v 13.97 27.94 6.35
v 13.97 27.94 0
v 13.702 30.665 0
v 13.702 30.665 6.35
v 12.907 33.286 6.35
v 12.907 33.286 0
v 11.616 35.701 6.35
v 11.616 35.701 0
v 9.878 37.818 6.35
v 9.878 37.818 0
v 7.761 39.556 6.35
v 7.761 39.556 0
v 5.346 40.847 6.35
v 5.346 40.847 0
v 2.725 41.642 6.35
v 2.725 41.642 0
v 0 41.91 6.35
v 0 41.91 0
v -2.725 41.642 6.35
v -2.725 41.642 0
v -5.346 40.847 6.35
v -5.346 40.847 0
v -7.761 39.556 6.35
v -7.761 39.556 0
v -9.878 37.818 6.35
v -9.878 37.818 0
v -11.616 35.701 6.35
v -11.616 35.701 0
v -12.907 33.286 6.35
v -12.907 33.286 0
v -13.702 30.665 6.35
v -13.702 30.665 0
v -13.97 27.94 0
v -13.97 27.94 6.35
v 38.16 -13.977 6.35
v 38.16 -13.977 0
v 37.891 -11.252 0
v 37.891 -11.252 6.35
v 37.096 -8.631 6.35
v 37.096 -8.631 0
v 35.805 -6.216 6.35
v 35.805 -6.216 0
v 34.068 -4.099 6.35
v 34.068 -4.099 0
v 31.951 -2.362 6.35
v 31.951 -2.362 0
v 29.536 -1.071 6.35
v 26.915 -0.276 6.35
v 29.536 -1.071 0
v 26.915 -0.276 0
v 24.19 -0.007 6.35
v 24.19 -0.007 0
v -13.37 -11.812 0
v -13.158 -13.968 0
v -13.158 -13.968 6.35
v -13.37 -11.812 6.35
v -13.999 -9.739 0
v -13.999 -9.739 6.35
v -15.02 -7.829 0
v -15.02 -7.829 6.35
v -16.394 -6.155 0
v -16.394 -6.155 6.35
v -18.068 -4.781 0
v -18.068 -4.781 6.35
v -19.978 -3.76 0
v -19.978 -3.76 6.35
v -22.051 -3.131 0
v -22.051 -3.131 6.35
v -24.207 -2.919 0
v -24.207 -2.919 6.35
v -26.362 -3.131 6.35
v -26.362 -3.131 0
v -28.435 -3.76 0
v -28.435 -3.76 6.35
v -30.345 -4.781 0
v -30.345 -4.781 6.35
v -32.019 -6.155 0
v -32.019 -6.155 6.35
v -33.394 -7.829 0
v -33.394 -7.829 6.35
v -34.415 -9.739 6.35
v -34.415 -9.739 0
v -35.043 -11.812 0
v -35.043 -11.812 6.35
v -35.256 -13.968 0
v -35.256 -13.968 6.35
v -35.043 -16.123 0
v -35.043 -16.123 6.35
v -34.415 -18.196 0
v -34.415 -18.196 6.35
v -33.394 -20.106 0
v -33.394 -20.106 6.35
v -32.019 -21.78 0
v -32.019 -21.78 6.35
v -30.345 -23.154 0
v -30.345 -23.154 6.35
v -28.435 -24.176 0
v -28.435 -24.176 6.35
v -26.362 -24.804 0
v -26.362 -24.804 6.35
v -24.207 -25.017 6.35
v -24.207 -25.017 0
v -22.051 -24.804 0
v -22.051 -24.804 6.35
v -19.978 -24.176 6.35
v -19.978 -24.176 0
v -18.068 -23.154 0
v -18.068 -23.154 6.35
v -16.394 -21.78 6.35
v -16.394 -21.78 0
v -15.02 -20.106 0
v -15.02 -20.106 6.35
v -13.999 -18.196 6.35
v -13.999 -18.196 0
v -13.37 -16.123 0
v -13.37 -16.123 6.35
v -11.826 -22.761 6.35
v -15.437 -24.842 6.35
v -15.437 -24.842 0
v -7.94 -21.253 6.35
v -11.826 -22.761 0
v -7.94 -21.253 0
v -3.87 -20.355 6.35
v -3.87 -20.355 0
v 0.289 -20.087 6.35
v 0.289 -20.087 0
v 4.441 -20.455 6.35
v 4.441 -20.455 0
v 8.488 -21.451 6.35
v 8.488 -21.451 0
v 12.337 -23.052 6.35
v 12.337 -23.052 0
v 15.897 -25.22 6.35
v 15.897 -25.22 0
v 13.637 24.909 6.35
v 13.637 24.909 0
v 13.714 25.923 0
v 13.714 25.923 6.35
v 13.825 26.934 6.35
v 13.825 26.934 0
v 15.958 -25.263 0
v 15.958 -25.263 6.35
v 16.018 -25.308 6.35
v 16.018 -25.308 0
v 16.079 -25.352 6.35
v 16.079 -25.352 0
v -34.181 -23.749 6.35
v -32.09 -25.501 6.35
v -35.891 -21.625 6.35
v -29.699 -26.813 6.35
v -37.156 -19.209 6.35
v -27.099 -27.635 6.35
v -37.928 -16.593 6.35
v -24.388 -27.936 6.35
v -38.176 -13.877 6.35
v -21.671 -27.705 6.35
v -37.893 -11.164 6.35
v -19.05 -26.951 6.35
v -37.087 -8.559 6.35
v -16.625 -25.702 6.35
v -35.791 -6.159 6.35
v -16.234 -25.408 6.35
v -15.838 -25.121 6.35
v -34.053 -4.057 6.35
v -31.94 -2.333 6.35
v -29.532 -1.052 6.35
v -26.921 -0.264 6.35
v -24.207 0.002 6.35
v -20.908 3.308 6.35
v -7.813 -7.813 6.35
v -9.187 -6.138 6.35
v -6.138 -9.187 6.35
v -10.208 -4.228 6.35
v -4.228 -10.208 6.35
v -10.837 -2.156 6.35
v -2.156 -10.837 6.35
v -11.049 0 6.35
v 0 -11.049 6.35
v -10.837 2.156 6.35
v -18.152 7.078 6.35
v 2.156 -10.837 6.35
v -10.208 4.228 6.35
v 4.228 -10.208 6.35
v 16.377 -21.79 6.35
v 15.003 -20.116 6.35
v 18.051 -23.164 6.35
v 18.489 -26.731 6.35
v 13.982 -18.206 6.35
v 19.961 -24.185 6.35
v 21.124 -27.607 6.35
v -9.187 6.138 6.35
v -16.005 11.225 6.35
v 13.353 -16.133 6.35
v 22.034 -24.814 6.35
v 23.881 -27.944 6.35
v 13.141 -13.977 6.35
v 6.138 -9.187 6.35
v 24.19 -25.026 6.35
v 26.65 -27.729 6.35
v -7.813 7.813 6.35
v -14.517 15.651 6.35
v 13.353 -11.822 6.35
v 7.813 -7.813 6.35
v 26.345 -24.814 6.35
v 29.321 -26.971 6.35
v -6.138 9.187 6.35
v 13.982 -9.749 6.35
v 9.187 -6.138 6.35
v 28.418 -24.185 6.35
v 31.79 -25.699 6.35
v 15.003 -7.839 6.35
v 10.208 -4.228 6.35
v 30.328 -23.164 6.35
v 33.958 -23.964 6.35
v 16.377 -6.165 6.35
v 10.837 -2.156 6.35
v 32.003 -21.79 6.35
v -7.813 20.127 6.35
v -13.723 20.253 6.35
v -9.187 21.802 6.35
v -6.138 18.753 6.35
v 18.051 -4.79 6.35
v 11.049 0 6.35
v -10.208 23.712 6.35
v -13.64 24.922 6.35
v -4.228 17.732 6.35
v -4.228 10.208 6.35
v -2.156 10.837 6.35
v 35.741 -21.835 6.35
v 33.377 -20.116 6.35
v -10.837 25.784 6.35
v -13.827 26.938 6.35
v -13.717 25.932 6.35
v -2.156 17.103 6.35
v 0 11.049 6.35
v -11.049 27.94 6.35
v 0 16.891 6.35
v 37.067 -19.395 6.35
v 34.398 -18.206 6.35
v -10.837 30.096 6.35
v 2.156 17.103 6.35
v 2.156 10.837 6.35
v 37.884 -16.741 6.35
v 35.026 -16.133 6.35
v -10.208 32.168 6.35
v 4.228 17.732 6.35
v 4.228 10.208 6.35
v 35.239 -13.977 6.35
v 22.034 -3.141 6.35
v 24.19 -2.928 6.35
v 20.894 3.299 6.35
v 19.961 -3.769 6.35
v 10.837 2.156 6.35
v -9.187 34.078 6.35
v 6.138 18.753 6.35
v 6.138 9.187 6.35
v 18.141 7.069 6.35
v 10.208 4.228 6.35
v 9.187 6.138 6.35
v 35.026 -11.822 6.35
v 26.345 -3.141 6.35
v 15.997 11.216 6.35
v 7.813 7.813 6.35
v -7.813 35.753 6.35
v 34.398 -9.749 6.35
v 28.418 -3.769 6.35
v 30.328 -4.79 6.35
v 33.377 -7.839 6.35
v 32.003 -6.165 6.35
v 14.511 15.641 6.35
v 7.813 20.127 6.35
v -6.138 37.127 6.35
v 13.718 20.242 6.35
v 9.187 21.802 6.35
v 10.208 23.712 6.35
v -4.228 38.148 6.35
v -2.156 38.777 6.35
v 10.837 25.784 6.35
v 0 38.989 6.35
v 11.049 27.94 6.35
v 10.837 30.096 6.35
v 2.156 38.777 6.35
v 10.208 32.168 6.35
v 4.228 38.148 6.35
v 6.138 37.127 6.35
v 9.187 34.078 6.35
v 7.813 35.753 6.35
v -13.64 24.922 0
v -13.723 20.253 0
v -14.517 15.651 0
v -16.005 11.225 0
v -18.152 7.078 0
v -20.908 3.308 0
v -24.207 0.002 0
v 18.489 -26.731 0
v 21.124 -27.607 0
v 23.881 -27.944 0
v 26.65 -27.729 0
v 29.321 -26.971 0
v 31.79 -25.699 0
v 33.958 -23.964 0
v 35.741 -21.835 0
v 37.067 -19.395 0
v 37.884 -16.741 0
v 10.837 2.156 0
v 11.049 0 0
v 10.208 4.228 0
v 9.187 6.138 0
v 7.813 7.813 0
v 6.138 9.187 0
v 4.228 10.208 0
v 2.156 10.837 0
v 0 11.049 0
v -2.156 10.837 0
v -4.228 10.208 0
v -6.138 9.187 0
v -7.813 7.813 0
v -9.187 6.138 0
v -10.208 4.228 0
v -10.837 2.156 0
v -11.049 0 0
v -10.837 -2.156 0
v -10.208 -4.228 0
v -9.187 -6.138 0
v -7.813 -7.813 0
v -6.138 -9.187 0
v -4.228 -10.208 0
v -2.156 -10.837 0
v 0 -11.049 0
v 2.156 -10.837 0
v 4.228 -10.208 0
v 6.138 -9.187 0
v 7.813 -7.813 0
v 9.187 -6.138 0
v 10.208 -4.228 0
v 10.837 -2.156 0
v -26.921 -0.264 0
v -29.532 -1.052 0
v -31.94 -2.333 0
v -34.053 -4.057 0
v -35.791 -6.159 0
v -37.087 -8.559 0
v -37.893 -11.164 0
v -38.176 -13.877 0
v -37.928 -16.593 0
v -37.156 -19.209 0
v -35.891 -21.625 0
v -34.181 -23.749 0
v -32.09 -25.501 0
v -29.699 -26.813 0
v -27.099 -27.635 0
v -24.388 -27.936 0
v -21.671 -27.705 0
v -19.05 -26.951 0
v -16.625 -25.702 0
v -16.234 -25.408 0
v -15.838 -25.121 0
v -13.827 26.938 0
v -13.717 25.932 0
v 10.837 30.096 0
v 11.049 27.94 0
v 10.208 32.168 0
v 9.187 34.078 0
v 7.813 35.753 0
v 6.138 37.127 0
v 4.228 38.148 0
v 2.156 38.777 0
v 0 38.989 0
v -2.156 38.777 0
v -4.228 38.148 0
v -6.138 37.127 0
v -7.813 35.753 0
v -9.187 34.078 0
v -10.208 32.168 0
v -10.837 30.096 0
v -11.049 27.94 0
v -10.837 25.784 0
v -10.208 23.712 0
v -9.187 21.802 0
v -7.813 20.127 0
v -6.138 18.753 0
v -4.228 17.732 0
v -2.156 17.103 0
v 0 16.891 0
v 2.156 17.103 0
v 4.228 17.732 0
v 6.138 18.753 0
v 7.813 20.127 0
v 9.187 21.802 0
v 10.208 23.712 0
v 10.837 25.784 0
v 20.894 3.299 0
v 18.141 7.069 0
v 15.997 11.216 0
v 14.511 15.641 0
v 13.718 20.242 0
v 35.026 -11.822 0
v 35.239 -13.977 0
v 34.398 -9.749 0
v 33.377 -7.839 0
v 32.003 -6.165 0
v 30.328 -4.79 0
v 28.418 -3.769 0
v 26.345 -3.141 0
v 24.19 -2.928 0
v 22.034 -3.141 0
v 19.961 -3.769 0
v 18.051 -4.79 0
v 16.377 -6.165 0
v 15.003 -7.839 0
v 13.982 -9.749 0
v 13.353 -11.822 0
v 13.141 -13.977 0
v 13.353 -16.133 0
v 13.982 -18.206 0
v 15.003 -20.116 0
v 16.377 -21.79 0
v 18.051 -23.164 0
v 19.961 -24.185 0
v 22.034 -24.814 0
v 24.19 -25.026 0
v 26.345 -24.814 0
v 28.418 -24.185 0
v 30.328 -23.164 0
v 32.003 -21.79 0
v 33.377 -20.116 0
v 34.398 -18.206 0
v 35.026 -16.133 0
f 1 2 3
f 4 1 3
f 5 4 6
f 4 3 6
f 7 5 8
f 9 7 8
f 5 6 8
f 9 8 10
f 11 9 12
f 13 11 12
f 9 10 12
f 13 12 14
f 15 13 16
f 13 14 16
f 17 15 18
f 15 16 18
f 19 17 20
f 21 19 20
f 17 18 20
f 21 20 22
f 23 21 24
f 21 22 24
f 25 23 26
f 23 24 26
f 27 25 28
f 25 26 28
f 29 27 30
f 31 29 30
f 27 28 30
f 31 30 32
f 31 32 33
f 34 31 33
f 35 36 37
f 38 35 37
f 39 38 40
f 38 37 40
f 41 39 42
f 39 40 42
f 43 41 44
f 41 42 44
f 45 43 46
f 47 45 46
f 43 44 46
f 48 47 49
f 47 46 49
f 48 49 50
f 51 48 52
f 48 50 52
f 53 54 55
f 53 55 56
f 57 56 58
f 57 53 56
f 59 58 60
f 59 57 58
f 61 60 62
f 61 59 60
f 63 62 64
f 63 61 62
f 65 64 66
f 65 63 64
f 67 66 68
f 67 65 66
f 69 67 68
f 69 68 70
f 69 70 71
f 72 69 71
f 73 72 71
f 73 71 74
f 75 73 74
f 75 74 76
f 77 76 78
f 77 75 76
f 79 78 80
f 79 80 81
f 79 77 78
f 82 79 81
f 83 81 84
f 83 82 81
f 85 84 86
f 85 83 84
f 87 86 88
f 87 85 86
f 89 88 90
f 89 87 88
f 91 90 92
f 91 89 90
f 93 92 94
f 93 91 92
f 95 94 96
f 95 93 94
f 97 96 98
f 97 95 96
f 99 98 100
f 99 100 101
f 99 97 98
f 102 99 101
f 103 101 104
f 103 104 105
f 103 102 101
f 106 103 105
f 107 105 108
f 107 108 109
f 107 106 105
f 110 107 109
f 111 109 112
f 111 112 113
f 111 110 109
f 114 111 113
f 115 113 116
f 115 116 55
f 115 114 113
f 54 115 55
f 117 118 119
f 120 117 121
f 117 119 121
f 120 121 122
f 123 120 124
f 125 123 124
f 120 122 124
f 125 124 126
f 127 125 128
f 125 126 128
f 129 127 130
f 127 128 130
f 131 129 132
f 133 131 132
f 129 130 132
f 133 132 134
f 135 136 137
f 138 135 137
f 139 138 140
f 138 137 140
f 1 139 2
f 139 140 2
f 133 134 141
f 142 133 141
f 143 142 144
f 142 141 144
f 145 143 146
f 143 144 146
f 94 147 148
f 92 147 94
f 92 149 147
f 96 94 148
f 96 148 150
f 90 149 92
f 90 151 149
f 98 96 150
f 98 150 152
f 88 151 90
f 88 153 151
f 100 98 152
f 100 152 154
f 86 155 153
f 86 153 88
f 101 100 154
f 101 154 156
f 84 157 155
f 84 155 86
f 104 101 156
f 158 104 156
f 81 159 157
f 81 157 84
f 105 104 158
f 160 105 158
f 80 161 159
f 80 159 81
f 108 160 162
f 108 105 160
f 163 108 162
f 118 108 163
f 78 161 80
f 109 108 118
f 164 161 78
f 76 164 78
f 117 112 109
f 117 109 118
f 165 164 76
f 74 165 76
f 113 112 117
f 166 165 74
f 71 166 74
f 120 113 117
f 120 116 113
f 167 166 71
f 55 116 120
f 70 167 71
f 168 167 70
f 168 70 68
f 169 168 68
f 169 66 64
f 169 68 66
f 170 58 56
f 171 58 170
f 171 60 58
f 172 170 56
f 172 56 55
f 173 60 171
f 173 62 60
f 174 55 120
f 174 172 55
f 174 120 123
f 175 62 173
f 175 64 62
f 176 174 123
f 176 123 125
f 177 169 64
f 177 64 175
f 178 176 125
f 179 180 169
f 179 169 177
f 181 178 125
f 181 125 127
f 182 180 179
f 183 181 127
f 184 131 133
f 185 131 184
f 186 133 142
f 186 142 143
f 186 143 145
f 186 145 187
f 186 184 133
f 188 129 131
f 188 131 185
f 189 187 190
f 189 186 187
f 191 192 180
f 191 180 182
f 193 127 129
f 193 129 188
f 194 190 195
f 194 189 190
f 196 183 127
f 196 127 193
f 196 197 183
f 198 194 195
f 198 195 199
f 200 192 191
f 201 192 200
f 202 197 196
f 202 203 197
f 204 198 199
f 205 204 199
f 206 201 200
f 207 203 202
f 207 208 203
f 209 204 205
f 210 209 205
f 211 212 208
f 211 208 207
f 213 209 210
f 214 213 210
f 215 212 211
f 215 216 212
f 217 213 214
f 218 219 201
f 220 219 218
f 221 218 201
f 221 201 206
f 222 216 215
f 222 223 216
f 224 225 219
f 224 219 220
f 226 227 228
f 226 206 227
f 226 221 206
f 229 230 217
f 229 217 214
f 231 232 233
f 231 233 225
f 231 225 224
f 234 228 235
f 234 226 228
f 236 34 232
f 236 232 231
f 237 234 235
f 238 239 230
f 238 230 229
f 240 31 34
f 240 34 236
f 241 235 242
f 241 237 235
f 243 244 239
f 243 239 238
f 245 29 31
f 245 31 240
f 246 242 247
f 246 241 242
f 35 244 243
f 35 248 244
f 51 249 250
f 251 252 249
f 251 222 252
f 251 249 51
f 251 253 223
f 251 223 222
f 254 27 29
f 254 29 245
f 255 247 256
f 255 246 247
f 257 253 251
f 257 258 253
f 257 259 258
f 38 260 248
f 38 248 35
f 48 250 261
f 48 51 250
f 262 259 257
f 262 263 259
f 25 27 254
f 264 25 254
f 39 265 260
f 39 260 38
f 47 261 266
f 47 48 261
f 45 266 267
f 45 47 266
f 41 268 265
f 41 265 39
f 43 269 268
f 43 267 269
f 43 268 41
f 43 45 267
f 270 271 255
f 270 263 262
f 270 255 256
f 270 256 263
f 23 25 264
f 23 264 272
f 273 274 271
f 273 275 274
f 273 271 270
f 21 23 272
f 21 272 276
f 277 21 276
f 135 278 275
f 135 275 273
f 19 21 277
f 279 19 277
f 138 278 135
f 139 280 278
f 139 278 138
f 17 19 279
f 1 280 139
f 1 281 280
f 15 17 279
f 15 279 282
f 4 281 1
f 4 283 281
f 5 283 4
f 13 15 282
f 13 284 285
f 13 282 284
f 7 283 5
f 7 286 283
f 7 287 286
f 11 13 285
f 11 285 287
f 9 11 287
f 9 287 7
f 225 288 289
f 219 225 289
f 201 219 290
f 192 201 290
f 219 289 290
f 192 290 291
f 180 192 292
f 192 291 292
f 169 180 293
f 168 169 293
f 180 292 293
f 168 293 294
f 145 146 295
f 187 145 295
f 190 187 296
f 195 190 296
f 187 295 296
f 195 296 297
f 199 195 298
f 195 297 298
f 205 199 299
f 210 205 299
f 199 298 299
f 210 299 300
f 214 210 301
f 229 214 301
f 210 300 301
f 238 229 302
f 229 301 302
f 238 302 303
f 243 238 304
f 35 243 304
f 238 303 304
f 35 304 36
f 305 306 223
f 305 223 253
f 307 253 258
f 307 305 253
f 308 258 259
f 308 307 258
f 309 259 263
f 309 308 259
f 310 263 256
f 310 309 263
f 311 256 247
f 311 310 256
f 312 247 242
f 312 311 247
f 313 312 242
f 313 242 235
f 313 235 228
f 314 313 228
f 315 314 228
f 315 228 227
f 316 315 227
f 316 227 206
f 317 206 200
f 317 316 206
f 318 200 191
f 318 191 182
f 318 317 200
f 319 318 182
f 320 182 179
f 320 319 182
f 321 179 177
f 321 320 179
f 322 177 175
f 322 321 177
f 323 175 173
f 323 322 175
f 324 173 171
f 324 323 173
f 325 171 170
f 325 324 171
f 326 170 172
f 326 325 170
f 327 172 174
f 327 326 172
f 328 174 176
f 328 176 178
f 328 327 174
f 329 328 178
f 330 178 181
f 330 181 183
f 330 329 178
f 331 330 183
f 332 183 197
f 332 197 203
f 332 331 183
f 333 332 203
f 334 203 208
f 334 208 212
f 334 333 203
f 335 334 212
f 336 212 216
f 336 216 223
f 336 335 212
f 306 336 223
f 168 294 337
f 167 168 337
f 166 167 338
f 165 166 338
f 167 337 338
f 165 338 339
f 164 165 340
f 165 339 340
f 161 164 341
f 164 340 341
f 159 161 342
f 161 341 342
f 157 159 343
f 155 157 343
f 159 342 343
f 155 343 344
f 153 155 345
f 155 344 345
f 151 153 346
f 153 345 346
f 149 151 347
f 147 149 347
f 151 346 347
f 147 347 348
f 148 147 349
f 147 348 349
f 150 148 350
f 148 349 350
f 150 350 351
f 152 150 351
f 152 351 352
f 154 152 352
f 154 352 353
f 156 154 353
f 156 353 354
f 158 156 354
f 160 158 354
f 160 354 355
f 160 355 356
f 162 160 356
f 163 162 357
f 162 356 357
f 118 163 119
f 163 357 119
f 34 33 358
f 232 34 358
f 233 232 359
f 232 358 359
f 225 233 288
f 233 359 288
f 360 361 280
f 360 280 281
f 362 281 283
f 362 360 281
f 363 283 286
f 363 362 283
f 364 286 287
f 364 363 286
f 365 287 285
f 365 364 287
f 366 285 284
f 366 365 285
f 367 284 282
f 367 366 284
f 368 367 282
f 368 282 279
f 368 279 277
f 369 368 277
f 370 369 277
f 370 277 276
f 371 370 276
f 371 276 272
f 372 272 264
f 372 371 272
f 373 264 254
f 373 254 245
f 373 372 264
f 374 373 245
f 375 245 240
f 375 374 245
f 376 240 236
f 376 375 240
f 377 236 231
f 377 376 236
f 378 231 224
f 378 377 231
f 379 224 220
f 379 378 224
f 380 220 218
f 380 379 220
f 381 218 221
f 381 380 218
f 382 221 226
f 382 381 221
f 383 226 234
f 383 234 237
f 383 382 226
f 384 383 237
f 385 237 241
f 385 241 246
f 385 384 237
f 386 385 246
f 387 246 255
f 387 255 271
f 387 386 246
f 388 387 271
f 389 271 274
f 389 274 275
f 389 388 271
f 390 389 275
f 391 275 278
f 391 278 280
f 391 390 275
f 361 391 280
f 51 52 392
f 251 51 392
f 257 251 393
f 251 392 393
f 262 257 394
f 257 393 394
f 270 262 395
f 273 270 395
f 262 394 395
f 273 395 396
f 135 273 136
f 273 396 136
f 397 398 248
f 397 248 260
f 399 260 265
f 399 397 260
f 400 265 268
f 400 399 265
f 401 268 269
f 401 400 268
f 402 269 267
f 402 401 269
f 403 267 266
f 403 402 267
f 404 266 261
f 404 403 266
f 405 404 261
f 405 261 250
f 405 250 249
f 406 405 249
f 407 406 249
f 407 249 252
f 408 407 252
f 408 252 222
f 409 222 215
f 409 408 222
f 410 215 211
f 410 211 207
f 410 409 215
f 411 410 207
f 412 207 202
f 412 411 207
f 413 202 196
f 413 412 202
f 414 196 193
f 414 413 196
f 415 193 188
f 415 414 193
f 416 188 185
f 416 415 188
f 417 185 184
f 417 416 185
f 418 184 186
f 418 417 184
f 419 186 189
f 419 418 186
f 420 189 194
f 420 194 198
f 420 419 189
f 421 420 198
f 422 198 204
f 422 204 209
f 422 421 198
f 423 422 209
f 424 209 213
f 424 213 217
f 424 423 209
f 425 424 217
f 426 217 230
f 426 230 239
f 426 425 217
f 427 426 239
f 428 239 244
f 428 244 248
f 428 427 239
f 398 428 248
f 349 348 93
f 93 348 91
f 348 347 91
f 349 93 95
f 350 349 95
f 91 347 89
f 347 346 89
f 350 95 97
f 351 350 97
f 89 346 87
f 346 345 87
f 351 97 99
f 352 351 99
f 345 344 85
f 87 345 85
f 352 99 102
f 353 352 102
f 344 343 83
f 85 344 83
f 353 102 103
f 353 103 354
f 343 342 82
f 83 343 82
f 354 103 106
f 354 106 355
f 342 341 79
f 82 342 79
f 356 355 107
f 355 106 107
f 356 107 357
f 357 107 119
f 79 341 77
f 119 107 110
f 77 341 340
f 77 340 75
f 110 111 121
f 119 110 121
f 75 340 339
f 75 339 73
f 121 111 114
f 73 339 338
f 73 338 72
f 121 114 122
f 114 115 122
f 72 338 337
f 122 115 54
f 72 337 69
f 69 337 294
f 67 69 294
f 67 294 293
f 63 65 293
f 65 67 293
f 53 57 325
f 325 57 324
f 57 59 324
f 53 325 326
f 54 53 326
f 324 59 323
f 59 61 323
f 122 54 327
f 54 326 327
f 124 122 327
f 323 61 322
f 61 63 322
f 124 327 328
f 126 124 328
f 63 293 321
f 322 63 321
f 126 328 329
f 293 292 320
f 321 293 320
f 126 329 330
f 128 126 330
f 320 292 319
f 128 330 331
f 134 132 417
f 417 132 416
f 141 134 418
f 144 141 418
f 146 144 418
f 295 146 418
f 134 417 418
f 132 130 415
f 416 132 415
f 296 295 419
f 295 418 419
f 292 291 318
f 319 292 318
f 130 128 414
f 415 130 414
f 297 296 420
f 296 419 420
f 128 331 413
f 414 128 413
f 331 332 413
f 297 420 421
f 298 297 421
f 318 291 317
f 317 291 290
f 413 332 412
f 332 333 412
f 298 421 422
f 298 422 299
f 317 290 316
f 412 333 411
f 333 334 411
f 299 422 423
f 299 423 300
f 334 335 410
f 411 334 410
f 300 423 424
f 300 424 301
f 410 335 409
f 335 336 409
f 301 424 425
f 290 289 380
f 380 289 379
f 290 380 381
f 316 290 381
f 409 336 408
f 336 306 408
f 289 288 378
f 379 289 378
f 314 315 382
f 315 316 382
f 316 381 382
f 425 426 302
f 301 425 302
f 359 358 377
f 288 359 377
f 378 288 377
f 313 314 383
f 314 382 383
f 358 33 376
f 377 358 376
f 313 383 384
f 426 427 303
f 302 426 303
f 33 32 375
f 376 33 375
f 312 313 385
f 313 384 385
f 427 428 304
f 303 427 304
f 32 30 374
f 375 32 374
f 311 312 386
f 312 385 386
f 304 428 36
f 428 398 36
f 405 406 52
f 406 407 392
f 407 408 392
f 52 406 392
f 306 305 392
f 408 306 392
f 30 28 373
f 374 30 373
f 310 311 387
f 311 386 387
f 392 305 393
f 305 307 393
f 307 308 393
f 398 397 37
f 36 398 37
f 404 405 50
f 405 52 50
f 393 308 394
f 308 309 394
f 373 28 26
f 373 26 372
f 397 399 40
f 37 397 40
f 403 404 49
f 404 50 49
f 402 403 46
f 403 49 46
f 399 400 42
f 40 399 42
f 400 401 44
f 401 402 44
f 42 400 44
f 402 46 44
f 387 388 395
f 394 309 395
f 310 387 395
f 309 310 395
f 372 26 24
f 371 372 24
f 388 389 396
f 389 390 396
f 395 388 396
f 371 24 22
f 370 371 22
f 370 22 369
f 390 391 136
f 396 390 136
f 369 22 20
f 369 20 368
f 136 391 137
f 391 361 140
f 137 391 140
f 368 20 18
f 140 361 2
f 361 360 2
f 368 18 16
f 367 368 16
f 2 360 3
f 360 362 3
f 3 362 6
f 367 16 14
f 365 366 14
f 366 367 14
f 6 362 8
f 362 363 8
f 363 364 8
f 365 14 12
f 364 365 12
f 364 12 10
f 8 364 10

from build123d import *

# Parameters (mm, degrees)
F0_R     = 11.049
F1_DEPTH = 6.35


with BuildPart() as f1:
    # F0 (on Top) → F1 (new body)
    with BuildSketch(Plane.XY):
        with BuildLine():
            ThreePointArc((24.1897099326, -0.0073616562), (15.9969747128, 11.215659094), (13.6372355628, 24.909042032))
            ThreePointArc((13.6372355628, 24.909042032), (-0.0068169573, 13.9700016632), (-13.6401871082, 24.9223526296))
            ThreePointArc((-13.6401871082, 24.9223526296), (-16.005456745, 11.2251220811), (-24.2066450876, 0.00241586))
            ThreePointArc((-24.2066450876, 0.00241586), (-14.3283633544, -4.0893024068), (-10.2366450876, -13.96758414))
            ThreePointArc((-10.2366450876, -13.96758414), (-11.6035855434, -19.9945062505), (-15.4369013691, -24.8419804502))
            ThreePointArc((-15.4369013691, -24.8419804502), (0.2894413219, -20.0870403352), (15.8966507841, -25.2195175864))
            ThreePointArc((15.8966507841, -25.2195175864), (10.9191820919, -9.6122739335), (24.1897099326, -0.0073616562))
        make_face()
        Circle(F0_R, mode=Mode.SUBTRACT)
        with BuildLine():
            ThreePointArc((-10.2366450876, -13.96758414), (-14.3283633544, -4.0893024068), (-24.2066450876, 0.00241586))
            ThreePointArc((-24.2066450876, 0.00241586), (-37.6059680769, -17.9196776899), (-16.6253454512, -25.7015006142))
            ThreePointArc((-16.6253454512, -25.7015006142), (-16.0368970517, -25.263757415), (-15.4369013691, -24.8419804502))
            ThreePointArc((-15.4369013691, -24.8419804502), (-11.6035855434, -19.9945062505), (-10.2366450876, -13.96758414))
        make_face()
        with Locations((-24.2066450876, -13.96758414)):
            Circle(F0_R, mode=Mode.SUBTRACT)
        with BuildLine():
            ThreePointArc((38.1597099326, -13.9773616562), (34.0679916658, -4.0990799231), (24.1897099326, -0.0073616562))
            ThreePointArc((24.1897099326, -0.0073616562), (10.9191820919, -9.6122739335), (15.8966507841, -25.2195175864))
            ThreePointArc((15.8966507841, -25.2195175864), (15.9879672376, -25.285462153), (16.0790108119, -25.3517829502))
            ThreePointArc((16.0790108119, -25.3517829502), (30.5871482201, -26.396447104), (38.1597099326, -13.9773616562))
        make_face()
        with Locations((24.1897099326, -13.9773616562)):
            Circle(F0_R, mode=Mode.SUBTRACT)
        with BuildLine():
            ThreePointArc((13.6372355628, 24.909042032), (13.7656925258, 26.4286847743), (13.97, 27.94))
            ThreePointArc((13.97, 27.94), (0, 41.91), (-13.97, 27.94))
            ThreePointArc((-13.97, 27.94), (-13.7675028866, 26.4352847759), (-13.6401871082, 24.9223526296))
            ThreePointArc((-13.6401871082, 24.9223526296), (-0.0068169573, 13.9700016632), (13.6372355628, 24.909042032))
        make_face()
        with Locations((0, 27.94)):
            Circle(F0_R, mode=Mode.SUBTRACT)
    extrude(amount=F1_DEPTH)


solid = f1.part
